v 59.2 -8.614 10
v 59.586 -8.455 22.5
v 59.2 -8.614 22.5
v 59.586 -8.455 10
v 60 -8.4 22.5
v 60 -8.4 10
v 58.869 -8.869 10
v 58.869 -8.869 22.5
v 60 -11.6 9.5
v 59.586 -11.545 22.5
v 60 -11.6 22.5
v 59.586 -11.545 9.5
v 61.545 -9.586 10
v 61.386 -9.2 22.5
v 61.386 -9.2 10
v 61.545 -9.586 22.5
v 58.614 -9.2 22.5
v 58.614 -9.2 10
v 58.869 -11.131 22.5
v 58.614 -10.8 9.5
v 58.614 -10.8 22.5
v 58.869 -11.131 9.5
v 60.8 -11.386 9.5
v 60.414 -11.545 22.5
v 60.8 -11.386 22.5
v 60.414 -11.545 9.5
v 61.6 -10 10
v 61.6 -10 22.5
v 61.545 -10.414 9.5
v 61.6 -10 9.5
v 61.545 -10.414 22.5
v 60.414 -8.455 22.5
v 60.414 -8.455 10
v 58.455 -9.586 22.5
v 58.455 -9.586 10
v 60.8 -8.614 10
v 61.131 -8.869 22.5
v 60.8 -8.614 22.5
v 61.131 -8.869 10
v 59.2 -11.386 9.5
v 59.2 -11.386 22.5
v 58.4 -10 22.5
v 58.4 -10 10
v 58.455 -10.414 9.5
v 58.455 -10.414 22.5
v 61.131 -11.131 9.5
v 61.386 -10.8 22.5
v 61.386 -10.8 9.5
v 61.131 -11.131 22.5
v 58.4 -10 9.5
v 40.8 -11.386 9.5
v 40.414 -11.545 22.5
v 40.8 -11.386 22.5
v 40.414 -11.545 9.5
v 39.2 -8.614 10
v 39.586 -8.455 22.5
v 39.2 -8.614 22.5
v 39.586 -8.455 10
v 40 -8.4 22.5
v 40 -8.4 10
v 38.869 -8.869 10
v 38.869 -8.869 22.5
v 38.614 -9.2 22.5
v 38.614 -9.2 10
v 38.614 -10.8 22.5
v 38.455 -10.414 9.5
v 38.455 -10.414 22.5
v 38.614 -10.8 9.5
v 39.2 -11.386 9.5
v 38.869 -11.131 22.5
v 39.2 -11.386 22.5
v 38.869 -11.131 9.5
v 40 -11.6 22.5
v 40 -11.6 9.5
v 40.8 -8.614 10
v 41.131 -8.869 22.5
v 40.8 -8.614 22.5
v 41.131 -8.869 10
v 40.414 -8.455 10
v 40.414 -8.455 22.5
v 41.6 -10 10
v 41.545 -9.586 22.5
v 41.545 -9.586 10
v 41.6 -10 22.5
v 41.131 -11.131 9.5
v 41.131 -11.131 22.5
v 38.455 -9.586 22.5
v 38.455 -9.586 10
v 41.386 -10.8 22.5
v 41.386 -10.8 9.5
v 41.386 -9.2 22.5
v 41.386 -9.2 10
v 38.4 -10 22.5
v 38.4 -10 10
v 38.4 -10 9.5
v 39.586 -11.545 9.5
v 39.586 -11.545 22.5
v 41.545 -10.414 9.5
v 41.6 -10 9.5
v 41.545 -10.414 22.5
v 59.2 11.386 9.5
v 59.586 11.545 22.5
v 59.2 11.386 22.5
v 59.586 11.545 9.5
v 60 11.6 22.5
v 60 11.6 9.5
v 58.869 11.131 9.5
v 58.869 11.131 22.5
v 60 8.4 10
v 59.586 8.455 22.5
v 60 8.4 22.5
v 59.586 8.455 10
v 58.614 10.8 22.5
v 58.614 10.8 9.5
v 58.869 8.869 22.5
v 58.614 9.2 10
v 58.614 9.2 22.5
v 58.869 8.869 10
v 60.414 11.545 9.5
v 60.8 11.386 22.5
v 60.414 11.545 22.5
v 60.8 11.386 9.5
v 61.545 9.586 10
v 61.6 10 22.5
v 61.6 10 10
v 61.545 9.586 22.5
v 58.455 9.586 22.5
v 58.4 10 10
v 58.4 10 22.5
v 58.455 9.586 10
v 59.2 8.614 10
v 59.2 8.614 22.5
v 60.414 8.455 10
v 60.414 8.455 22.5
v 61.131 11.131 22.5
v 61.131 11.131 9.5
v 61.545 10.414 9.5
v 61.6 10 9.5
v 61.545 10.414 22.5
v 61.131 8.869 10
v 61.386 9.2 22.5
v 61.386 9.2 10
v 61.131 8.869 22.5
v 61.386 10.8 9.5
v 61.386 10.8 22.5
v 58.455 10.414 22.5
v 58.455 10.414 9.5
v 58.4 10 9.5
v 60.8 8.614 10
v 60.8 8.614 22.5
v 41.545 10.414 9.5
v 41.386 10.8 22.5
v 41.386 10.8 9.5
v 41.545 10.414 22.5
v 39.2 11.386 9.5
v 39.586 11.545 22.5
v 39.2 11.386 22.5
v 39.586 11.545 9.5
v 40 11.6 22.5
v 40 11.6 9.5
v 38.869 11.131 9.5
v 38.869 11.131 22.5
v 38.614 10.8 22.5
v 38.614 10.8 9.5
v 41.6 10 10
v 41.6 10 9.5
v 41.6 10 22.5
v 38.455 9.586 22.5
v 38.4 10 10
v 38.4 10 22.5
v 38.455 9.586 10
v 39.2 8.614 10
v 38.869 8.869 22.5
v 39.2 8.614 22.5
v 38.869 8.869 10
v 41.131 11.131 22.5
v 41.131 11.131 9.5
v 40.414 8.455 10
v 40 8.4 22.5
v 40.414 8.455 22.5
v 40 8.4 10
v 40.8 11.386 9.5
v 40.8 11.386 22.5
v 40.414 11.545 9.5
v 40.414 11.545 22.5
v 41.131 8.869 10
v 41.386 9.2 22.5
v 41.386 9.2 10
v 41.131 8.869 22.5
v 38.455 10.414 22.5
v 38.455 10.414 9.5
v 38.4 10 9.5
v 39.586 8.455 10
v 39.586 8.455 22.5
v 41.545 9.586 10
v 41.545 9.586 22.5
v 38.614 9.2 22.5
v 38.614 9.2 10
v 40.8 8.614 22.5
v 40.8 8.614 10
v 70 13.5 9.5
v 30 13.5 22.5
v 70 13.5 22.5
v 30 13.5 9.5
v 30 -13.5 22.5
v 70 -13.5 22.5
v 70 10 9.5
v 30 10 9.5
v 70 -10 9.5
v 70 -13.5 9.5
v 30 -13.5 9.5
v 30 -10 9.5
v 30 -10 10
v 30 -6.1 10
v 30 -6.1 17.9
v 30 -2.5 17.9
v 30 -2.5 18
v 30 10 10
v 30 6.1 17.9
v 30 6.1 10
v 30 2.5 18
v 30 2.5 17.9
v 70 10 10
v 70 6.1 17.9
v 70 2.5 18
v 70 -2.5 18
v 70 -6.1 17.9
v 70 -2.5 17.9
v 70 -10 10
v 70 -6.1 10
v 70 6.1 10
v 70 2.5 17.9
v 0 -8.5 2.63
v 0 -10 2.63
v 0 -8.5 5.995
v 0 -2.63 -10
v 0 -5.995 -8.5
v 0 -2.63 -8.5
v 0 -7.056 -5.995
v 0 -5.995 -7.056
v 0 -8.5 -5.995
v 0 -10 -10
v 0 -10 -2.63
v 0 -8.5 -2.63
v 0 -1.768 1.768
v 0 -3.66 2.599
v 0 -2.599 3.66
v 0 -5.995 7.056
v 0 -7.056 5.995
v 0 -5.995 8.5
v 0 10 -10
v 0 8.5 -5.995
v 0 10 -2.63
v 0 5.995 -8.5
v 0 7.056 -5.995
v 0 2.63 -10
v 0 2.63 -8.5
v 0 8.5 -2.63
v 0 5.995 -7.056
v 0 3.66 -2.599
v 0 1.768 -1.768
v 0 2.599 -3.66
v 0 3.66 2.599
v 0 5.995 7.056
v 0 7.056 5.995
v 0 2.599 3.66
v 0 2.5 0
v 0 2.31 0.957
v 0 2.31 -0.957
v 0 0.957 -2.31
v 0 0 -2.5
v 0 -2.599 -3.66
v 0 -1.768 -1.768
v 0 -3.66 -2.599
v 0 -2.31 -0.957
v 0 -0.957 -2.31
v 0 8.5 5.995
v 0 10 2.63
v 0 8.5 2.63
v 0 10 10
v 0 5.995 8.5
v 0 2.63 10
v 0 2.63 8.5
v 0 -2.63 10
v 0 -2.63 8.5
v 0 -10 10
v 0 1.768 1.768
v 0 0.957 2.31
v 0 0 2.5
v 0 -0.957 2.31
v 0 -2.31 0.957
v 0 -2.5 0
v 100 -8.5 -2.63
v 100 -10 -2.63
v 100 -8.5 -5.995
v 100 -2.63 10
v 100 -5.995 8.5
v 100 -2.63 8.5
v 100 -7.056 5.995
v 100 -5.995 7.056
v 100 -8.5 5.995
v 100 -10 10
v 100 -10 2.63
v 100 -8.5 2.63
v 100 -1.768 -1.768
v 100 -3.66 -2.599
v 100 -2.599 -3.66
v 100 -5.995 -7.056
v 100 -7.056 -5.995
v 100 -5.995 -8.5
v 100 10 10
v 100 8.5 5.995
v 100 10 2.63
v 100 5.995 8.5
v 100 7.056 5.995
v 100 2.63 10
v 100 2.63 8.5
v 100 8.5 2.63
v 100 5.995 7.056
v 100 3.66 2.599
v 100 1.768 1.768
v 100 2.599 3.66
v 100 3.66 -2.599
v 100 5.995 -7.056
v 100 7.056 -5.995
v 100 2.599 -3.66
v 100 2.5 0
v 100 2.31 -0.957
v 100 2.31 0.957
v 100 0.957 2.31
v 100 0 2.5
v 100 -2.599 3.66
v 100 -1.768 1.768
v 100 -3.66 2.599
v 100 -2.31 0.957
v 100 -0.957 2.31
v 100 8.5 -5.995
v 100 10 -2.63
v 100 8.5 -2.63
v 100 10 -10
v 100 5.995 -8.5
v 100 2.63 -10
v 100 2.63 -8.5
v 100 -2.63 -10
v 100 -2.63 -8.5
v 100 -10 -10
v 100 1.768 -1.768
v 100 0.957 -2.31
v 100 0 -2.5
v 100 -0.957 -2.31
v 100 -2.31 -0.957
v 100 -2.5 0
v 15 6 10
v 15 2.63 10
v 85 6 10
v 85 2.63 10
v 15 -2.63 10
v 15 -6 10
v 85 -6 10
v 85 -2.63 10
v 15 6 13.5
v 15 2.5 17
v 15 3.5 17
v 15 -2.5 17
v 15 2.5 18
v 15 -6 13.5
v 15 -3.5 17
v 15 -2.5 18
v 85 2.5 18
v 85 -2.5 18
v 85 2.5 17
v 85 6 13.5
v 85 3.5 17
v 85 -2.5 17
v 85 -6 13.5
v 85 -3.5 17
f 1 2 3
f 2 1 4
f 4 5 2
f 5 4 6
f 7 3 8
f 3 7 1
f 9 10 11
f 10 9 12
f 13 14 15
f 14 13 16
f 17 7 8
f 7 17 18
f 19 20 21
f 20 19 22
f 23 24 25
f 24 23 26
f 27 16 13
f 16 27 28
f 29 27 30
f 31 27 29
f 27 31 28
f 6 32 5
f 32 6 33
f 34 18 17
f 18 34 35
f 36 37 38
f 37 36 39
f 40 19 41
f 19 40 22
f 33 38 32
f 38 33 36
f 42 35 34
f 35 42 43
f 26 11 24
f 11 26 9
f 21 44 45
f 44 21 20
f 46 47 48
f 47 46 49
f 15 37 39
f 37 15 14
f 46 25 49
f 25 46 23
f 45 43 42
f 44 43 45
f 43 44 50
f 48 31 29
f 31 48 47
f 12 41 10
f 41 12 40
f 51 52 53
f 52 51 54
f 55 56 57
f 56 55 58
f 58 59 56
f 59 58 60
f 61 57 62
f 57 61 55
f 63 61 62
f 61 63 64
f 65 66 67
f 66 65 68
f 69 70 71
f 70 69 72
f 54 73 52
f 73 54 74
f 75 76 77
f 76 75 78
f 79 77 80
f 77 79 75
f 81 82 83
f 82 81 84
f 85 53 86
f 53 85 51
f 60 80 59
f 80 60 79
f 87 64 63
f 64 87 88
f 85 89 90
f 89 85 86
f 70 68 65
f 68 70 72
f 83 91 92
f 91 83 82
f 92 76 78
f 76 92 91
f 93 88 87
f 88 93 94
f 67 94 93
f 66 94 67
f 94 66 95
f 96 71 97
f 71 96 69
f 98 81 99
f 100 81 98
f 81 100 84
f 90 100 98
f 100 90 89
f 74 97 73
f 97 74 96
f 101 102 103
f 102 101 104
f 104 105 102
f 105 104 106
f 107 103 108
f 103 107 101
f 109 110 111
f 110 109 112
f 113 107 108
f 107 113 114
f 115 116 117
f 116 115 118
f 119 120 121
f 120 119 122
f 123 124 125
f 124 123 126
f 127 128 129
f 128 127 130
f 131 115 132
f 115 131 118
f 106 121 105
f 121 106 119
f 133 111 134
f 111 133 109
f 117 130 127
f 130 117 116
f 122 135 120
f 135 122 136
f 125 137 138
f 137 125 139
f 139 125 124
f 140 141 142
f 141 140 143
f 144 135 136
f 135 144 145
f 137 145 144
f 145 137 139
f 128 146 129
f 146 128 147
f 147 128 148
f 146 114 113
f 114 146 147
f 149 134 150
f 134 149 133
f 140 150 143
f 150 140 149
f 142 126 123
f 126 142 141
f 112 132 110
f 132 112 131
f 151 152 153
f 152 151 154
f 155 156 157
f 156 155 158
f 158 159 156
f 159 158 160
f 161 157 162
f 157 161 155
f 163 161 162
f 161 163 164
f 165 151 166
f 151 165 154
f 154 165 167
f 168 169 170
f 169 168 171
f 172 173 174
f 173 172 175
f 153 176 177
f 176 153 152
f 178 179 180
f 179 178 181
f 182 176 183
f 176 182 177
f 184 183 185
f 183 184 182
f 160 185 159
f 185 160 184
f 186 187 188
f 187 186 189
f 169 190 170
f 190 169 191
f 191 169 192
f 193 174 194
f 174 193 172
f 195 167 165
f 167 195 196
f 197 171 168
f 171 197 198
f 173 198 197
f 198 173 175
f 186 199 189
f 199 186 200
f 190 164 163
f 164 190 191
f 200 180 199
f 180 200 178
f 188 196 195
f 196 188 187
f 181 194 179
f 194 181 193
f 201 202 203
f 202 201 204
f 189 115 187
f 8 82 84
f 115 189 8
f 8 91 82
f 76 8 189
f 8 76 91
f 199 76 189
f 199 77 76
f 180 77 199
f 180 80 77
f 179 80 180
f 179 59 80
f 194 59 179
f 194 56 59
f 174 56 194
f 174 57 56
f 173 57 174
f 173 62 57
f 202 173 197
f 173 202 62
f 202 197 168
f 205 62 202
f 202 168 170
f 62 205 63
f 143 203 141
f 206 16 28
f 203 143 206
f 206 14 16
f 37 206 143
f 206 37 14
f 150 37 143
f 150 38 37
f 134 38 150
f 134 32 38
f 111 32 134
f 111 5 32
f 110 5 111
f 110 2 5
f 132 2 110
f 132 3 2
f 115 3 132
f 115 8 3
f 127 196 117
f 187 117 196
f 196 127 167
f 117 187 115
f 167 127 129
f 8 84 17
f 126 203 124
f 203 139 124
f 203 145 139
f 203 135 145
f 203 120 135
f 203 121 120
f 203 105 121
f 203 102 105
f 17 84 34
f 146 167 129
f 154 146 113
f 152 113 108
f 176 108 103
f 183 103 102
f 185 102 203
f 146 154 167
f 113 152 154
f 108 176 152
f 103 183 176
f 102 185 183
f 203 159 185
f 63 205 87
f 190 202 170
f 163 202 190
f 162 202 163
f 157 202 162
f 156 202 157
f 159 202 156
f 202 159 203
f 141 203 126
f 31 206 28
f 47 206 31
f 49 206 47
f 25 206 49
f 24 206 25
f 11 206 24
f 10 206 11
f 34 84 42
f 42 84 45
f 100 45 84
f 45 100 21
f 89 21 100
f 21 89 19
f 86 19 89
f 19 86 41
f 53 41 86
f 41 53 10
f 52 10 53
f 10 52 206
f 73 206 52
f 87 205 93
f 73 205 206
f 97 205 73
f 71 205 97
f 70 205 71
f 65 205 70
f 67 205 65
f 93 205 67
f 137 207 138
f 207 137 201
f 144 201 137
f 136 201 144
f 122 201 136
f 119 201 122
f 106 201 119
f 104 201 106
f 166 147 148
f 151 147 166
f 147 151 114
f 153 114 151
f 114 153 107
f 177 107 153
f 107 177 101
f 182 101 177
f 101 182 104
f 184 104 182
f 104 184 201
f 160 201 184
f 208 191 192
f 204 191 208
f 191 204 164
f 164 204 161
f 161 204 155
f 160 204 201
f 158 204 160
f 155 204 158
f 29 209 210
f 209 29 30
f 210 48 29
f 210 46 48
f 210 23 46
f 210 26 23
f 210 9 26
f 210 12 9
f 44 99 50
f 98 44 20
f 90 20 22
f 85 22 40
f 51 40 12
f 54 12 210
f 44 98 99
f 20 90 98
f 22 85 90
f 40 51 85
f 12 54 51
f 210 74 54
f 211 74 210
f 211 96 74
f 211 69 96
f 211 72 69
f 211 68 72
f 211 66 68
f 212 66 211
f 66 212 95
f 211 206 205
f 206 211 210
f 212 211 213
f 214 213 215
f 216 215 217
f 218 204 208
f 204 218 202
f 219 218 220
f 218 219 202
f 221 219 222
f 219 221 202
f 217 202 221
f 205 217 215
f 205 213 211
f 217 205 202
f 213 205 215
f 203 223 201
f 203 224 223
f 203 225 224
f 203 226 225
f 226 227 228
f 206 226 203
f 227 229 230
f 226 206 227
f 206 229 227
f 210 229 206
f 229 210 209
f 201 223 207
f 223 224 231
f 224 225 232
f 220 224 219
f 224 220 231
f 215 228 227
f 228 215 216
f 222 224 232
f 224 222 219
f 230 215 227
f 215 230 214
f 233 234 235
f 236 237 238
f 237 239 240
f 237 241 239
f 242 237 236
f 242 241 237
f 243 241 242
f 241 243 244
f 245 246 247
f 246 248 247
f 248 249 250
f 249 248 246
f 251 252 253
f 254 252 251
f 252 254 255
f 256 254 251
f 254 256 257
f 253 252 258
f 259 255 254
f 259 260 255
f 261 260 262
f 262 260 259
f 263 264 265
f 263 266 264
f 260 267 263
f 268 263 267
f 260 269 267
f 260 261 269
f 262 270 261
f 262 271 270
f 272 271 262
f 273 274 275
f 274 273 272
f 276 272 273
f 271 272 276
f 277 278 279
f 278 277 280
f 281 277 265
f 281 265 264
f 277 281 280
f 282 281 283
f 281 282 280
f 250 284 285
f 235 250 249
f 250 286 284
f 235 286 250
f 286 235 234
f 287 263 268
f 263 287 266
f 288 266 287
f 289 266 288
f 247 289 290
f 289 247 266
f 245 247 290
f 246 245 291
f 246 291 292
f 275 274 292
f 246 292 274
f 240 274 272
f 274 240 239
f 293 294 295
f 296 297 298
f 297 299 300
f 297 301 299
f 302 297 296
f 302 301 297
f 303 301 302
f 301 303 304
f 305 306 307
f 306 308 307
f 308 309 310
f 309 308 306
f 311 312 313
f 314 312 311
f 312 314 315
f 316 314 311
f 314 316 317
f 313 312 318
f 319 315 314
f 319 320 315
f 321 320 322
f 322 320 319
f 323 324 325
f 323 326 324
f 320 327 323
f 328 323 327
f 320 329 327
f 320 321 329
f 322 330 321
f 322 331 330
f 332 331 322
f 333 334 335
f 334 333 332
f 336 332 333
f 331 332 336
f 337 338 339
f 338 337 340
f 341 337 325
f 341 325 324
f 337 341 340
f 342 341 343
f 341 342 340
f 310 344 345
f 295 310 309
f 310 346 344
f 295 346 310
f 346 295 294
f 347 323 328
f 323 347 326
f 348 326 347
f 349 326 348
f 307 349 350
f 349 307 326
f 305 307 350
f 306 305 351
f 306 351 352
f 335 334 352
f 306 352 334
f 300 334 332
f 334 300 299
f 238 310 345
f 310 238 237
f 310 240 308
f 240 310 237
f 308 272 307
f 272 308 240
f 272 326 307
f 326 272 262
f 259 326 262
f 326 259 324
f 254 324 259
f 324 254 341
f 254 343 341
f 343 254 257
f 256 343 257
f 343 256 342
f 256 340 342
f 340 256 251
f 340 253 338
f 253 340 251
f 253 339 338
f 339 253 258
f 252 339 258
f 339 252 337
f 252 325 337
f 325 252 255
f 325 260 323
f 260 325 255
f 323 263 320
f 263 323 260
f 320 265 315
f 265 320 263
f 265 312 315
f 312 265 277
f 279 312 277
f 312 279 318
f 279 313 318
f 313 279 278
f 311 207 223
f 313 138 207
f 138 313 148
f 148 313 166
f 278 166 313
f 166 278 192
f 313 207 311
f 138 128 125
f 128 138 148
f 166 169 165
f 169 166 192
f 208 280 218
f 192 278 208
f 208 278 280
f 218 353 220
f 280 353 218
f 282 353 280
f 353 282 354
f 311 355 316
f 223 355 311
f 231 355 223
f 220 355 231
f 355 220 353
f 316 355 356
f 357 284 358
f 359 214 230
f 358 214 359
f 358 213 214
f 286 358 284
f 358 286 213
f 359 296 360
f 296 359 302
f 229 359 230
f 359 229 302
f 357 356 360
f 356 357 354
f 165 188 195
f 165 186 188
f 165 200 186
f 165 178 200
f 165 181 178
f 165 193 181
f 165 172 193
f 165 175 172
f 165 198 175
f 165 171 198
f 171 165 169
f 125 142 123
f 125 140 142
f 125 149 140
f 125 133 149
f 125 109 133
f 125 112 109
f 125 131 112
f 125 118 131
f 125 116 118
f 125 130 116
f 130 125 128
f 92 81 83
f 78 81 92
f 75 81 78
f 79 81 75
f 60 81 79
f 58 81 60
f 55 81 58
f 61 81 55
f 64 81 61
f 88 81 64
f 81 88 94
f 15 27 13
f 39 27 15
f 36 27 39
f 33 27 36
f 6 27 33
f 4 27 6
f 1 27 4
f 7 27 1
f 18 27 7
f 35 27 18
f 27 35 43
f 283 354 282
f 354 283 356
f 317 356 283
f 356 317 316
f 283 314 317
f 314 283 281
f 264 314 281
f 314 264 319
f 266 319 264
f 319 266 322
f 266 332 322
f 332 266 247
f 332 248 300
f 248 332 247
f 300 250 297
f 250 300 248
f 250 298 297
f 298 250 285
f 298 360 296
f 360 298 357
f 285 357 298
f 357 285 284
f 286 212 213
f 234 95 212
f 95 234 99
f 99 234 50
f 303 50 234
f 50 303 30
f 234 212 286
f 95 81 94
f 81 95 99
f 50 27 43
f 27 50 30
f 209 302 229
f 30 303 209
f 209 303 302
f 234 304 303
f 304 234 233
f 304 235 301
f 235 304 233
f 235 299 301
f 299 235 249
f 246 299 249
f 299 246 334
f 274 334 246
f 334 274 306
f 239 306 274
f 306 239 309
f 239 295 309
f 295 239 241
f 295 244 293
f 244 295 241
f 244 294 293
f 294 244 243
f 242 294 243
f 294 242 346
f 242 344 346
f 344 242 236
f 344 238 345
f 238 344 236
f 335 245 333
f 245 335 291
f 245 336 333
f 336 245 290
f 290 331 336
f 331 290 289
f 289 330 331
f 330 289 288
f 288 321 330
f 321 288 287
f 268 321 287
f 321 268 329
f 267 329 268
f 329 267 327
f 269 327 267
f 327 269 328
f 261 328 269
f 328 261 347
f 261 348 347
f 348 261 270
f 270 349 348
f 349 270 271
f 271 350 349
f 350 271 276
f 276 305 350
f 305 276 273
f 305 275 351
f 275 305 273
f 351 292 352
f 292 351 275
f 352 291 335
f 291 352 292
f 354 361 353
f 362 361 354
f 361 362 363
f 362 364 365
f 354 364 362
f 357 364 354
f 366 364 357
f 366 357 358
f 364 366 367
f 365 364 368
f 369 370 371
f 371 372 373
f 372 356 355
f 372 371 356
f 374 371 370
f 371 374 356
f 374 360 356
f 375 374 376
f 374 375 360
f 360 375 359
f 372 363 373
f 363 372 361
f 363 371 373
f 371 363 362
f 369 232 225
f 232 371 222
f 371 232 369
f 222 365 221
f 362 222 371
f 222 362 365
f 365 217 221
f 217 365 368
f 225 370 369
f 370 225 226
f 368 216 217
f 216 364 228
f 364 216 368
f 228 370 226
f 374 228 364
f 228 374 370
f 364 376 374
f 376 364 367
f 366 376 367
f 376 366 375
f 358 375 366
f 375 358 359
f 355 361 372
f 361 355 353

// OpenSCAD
// 2020 Aluminum Extrusion Module
// Standard 20mm x 20mm T-slot profile


mgn12h_rail_assembly();



module 2020_extrusion(length=100) {
    color("LightGray")
    linear_extrude(height=length)
        2020_profile();
}

module 2020_profile() {
    difference() {
        square([20,20], center=true);
        square([17,17], center=true);
        square([40,5.26], center=true);
        rotate([0,0,90]) square([40,5.26], center=true);
    }

    difference() {
        union() {
            square([7.32,7.32], center=true);
            rotate([0,0,45]) square([1.5,25], center=true);
            rotate([0,0,-45]) square([1.5,25], center=true);
        }
        circle(d=5, $fn=16);
    }

    translate([7.9975,7.9975,0]) square([4.005,4.005], center=true);
    translate([-7.9975,7.9975,0]) square([4.005,4.005], center=true);
    translate([7.9975,-7.9975,0]) square([4.005,4.005], center=true);
    translate([-7.9975,-7.9975,0]) square([4.005,4.005], center=true);
}

// MGN12H Linear Rail
// Cross-section profile based on HIWIN/generic specs
module mgn12_rail_profile() {
    polygon(points=[
        [-6, 0], [6, 0],
        [6, 3.5],
        [3.5, 7], [2.5, 7],
        [2.5, 8], [-2.5, 8],
        [-2.5, 7], [-3.5, 7],
        [-6, 3.5]
    ]);
}

module mgn12_rail(length=100) {
    color("DarkGray")
    linear_extrude(height=length)
        mgn12_rail_profile();
}

// MGN12H Carriage Block
module mgn12h_carriage() {
    // Origin at top-center of carriage (mounting surface)
    // Carriage body: 27mm wide (X), 40mm long (Y), 13mm tall (Z)
    // Mounting holes on top face: 20mm x 20mm pattern
    // Rail channel runs through the bottom portion
    
    color("SlateGray")
    difference() {
        // Carriage body - top face at Z=0, body goes down
        translate([-13.5, -20, -13])
            cube([27, 40, 13]);
        
        // Rail channel (bottom center) - 12.2mm wide, 8.5mm tall
        translate([-6.1, -21, -13.1])
            cube([12.2, 42, 8.5]);
        
        // Mounting holes - 20mm x 20mm pattern, M3 from top
        for (x = [-10, 10])
            for (y = [-10, 10])
                translate([x, y, -13.1])
                    cylinder(d=3.2, h=14, $fn=24);
    }
}

// Assembly: Rail mounted on 2020 extrusion with carriage
// Everything runs along X axis. Y=0 centered. Z up.
module mgn12h_rail_assembly(rail_length=100) {
    rail_offset = 15;
    
    // 2020 Extrusion along X
    rotate([0, 90, 0])
        2020_extrusion(rail_length);
    
    // MGN12 Rail along X, sitting on extrusion top face (Z=10)
    translate([rail_offset, 0, 10])
    rotate([90, 0, 90])
        mgn12_rail(rail_length - 2*rail_offset);
    
    // Carriage centered on rail at midpoint
    translate([rail_length/2, 0, 22.5])
      rotate([0,0,90])
        mgn12h_carriage();
}
